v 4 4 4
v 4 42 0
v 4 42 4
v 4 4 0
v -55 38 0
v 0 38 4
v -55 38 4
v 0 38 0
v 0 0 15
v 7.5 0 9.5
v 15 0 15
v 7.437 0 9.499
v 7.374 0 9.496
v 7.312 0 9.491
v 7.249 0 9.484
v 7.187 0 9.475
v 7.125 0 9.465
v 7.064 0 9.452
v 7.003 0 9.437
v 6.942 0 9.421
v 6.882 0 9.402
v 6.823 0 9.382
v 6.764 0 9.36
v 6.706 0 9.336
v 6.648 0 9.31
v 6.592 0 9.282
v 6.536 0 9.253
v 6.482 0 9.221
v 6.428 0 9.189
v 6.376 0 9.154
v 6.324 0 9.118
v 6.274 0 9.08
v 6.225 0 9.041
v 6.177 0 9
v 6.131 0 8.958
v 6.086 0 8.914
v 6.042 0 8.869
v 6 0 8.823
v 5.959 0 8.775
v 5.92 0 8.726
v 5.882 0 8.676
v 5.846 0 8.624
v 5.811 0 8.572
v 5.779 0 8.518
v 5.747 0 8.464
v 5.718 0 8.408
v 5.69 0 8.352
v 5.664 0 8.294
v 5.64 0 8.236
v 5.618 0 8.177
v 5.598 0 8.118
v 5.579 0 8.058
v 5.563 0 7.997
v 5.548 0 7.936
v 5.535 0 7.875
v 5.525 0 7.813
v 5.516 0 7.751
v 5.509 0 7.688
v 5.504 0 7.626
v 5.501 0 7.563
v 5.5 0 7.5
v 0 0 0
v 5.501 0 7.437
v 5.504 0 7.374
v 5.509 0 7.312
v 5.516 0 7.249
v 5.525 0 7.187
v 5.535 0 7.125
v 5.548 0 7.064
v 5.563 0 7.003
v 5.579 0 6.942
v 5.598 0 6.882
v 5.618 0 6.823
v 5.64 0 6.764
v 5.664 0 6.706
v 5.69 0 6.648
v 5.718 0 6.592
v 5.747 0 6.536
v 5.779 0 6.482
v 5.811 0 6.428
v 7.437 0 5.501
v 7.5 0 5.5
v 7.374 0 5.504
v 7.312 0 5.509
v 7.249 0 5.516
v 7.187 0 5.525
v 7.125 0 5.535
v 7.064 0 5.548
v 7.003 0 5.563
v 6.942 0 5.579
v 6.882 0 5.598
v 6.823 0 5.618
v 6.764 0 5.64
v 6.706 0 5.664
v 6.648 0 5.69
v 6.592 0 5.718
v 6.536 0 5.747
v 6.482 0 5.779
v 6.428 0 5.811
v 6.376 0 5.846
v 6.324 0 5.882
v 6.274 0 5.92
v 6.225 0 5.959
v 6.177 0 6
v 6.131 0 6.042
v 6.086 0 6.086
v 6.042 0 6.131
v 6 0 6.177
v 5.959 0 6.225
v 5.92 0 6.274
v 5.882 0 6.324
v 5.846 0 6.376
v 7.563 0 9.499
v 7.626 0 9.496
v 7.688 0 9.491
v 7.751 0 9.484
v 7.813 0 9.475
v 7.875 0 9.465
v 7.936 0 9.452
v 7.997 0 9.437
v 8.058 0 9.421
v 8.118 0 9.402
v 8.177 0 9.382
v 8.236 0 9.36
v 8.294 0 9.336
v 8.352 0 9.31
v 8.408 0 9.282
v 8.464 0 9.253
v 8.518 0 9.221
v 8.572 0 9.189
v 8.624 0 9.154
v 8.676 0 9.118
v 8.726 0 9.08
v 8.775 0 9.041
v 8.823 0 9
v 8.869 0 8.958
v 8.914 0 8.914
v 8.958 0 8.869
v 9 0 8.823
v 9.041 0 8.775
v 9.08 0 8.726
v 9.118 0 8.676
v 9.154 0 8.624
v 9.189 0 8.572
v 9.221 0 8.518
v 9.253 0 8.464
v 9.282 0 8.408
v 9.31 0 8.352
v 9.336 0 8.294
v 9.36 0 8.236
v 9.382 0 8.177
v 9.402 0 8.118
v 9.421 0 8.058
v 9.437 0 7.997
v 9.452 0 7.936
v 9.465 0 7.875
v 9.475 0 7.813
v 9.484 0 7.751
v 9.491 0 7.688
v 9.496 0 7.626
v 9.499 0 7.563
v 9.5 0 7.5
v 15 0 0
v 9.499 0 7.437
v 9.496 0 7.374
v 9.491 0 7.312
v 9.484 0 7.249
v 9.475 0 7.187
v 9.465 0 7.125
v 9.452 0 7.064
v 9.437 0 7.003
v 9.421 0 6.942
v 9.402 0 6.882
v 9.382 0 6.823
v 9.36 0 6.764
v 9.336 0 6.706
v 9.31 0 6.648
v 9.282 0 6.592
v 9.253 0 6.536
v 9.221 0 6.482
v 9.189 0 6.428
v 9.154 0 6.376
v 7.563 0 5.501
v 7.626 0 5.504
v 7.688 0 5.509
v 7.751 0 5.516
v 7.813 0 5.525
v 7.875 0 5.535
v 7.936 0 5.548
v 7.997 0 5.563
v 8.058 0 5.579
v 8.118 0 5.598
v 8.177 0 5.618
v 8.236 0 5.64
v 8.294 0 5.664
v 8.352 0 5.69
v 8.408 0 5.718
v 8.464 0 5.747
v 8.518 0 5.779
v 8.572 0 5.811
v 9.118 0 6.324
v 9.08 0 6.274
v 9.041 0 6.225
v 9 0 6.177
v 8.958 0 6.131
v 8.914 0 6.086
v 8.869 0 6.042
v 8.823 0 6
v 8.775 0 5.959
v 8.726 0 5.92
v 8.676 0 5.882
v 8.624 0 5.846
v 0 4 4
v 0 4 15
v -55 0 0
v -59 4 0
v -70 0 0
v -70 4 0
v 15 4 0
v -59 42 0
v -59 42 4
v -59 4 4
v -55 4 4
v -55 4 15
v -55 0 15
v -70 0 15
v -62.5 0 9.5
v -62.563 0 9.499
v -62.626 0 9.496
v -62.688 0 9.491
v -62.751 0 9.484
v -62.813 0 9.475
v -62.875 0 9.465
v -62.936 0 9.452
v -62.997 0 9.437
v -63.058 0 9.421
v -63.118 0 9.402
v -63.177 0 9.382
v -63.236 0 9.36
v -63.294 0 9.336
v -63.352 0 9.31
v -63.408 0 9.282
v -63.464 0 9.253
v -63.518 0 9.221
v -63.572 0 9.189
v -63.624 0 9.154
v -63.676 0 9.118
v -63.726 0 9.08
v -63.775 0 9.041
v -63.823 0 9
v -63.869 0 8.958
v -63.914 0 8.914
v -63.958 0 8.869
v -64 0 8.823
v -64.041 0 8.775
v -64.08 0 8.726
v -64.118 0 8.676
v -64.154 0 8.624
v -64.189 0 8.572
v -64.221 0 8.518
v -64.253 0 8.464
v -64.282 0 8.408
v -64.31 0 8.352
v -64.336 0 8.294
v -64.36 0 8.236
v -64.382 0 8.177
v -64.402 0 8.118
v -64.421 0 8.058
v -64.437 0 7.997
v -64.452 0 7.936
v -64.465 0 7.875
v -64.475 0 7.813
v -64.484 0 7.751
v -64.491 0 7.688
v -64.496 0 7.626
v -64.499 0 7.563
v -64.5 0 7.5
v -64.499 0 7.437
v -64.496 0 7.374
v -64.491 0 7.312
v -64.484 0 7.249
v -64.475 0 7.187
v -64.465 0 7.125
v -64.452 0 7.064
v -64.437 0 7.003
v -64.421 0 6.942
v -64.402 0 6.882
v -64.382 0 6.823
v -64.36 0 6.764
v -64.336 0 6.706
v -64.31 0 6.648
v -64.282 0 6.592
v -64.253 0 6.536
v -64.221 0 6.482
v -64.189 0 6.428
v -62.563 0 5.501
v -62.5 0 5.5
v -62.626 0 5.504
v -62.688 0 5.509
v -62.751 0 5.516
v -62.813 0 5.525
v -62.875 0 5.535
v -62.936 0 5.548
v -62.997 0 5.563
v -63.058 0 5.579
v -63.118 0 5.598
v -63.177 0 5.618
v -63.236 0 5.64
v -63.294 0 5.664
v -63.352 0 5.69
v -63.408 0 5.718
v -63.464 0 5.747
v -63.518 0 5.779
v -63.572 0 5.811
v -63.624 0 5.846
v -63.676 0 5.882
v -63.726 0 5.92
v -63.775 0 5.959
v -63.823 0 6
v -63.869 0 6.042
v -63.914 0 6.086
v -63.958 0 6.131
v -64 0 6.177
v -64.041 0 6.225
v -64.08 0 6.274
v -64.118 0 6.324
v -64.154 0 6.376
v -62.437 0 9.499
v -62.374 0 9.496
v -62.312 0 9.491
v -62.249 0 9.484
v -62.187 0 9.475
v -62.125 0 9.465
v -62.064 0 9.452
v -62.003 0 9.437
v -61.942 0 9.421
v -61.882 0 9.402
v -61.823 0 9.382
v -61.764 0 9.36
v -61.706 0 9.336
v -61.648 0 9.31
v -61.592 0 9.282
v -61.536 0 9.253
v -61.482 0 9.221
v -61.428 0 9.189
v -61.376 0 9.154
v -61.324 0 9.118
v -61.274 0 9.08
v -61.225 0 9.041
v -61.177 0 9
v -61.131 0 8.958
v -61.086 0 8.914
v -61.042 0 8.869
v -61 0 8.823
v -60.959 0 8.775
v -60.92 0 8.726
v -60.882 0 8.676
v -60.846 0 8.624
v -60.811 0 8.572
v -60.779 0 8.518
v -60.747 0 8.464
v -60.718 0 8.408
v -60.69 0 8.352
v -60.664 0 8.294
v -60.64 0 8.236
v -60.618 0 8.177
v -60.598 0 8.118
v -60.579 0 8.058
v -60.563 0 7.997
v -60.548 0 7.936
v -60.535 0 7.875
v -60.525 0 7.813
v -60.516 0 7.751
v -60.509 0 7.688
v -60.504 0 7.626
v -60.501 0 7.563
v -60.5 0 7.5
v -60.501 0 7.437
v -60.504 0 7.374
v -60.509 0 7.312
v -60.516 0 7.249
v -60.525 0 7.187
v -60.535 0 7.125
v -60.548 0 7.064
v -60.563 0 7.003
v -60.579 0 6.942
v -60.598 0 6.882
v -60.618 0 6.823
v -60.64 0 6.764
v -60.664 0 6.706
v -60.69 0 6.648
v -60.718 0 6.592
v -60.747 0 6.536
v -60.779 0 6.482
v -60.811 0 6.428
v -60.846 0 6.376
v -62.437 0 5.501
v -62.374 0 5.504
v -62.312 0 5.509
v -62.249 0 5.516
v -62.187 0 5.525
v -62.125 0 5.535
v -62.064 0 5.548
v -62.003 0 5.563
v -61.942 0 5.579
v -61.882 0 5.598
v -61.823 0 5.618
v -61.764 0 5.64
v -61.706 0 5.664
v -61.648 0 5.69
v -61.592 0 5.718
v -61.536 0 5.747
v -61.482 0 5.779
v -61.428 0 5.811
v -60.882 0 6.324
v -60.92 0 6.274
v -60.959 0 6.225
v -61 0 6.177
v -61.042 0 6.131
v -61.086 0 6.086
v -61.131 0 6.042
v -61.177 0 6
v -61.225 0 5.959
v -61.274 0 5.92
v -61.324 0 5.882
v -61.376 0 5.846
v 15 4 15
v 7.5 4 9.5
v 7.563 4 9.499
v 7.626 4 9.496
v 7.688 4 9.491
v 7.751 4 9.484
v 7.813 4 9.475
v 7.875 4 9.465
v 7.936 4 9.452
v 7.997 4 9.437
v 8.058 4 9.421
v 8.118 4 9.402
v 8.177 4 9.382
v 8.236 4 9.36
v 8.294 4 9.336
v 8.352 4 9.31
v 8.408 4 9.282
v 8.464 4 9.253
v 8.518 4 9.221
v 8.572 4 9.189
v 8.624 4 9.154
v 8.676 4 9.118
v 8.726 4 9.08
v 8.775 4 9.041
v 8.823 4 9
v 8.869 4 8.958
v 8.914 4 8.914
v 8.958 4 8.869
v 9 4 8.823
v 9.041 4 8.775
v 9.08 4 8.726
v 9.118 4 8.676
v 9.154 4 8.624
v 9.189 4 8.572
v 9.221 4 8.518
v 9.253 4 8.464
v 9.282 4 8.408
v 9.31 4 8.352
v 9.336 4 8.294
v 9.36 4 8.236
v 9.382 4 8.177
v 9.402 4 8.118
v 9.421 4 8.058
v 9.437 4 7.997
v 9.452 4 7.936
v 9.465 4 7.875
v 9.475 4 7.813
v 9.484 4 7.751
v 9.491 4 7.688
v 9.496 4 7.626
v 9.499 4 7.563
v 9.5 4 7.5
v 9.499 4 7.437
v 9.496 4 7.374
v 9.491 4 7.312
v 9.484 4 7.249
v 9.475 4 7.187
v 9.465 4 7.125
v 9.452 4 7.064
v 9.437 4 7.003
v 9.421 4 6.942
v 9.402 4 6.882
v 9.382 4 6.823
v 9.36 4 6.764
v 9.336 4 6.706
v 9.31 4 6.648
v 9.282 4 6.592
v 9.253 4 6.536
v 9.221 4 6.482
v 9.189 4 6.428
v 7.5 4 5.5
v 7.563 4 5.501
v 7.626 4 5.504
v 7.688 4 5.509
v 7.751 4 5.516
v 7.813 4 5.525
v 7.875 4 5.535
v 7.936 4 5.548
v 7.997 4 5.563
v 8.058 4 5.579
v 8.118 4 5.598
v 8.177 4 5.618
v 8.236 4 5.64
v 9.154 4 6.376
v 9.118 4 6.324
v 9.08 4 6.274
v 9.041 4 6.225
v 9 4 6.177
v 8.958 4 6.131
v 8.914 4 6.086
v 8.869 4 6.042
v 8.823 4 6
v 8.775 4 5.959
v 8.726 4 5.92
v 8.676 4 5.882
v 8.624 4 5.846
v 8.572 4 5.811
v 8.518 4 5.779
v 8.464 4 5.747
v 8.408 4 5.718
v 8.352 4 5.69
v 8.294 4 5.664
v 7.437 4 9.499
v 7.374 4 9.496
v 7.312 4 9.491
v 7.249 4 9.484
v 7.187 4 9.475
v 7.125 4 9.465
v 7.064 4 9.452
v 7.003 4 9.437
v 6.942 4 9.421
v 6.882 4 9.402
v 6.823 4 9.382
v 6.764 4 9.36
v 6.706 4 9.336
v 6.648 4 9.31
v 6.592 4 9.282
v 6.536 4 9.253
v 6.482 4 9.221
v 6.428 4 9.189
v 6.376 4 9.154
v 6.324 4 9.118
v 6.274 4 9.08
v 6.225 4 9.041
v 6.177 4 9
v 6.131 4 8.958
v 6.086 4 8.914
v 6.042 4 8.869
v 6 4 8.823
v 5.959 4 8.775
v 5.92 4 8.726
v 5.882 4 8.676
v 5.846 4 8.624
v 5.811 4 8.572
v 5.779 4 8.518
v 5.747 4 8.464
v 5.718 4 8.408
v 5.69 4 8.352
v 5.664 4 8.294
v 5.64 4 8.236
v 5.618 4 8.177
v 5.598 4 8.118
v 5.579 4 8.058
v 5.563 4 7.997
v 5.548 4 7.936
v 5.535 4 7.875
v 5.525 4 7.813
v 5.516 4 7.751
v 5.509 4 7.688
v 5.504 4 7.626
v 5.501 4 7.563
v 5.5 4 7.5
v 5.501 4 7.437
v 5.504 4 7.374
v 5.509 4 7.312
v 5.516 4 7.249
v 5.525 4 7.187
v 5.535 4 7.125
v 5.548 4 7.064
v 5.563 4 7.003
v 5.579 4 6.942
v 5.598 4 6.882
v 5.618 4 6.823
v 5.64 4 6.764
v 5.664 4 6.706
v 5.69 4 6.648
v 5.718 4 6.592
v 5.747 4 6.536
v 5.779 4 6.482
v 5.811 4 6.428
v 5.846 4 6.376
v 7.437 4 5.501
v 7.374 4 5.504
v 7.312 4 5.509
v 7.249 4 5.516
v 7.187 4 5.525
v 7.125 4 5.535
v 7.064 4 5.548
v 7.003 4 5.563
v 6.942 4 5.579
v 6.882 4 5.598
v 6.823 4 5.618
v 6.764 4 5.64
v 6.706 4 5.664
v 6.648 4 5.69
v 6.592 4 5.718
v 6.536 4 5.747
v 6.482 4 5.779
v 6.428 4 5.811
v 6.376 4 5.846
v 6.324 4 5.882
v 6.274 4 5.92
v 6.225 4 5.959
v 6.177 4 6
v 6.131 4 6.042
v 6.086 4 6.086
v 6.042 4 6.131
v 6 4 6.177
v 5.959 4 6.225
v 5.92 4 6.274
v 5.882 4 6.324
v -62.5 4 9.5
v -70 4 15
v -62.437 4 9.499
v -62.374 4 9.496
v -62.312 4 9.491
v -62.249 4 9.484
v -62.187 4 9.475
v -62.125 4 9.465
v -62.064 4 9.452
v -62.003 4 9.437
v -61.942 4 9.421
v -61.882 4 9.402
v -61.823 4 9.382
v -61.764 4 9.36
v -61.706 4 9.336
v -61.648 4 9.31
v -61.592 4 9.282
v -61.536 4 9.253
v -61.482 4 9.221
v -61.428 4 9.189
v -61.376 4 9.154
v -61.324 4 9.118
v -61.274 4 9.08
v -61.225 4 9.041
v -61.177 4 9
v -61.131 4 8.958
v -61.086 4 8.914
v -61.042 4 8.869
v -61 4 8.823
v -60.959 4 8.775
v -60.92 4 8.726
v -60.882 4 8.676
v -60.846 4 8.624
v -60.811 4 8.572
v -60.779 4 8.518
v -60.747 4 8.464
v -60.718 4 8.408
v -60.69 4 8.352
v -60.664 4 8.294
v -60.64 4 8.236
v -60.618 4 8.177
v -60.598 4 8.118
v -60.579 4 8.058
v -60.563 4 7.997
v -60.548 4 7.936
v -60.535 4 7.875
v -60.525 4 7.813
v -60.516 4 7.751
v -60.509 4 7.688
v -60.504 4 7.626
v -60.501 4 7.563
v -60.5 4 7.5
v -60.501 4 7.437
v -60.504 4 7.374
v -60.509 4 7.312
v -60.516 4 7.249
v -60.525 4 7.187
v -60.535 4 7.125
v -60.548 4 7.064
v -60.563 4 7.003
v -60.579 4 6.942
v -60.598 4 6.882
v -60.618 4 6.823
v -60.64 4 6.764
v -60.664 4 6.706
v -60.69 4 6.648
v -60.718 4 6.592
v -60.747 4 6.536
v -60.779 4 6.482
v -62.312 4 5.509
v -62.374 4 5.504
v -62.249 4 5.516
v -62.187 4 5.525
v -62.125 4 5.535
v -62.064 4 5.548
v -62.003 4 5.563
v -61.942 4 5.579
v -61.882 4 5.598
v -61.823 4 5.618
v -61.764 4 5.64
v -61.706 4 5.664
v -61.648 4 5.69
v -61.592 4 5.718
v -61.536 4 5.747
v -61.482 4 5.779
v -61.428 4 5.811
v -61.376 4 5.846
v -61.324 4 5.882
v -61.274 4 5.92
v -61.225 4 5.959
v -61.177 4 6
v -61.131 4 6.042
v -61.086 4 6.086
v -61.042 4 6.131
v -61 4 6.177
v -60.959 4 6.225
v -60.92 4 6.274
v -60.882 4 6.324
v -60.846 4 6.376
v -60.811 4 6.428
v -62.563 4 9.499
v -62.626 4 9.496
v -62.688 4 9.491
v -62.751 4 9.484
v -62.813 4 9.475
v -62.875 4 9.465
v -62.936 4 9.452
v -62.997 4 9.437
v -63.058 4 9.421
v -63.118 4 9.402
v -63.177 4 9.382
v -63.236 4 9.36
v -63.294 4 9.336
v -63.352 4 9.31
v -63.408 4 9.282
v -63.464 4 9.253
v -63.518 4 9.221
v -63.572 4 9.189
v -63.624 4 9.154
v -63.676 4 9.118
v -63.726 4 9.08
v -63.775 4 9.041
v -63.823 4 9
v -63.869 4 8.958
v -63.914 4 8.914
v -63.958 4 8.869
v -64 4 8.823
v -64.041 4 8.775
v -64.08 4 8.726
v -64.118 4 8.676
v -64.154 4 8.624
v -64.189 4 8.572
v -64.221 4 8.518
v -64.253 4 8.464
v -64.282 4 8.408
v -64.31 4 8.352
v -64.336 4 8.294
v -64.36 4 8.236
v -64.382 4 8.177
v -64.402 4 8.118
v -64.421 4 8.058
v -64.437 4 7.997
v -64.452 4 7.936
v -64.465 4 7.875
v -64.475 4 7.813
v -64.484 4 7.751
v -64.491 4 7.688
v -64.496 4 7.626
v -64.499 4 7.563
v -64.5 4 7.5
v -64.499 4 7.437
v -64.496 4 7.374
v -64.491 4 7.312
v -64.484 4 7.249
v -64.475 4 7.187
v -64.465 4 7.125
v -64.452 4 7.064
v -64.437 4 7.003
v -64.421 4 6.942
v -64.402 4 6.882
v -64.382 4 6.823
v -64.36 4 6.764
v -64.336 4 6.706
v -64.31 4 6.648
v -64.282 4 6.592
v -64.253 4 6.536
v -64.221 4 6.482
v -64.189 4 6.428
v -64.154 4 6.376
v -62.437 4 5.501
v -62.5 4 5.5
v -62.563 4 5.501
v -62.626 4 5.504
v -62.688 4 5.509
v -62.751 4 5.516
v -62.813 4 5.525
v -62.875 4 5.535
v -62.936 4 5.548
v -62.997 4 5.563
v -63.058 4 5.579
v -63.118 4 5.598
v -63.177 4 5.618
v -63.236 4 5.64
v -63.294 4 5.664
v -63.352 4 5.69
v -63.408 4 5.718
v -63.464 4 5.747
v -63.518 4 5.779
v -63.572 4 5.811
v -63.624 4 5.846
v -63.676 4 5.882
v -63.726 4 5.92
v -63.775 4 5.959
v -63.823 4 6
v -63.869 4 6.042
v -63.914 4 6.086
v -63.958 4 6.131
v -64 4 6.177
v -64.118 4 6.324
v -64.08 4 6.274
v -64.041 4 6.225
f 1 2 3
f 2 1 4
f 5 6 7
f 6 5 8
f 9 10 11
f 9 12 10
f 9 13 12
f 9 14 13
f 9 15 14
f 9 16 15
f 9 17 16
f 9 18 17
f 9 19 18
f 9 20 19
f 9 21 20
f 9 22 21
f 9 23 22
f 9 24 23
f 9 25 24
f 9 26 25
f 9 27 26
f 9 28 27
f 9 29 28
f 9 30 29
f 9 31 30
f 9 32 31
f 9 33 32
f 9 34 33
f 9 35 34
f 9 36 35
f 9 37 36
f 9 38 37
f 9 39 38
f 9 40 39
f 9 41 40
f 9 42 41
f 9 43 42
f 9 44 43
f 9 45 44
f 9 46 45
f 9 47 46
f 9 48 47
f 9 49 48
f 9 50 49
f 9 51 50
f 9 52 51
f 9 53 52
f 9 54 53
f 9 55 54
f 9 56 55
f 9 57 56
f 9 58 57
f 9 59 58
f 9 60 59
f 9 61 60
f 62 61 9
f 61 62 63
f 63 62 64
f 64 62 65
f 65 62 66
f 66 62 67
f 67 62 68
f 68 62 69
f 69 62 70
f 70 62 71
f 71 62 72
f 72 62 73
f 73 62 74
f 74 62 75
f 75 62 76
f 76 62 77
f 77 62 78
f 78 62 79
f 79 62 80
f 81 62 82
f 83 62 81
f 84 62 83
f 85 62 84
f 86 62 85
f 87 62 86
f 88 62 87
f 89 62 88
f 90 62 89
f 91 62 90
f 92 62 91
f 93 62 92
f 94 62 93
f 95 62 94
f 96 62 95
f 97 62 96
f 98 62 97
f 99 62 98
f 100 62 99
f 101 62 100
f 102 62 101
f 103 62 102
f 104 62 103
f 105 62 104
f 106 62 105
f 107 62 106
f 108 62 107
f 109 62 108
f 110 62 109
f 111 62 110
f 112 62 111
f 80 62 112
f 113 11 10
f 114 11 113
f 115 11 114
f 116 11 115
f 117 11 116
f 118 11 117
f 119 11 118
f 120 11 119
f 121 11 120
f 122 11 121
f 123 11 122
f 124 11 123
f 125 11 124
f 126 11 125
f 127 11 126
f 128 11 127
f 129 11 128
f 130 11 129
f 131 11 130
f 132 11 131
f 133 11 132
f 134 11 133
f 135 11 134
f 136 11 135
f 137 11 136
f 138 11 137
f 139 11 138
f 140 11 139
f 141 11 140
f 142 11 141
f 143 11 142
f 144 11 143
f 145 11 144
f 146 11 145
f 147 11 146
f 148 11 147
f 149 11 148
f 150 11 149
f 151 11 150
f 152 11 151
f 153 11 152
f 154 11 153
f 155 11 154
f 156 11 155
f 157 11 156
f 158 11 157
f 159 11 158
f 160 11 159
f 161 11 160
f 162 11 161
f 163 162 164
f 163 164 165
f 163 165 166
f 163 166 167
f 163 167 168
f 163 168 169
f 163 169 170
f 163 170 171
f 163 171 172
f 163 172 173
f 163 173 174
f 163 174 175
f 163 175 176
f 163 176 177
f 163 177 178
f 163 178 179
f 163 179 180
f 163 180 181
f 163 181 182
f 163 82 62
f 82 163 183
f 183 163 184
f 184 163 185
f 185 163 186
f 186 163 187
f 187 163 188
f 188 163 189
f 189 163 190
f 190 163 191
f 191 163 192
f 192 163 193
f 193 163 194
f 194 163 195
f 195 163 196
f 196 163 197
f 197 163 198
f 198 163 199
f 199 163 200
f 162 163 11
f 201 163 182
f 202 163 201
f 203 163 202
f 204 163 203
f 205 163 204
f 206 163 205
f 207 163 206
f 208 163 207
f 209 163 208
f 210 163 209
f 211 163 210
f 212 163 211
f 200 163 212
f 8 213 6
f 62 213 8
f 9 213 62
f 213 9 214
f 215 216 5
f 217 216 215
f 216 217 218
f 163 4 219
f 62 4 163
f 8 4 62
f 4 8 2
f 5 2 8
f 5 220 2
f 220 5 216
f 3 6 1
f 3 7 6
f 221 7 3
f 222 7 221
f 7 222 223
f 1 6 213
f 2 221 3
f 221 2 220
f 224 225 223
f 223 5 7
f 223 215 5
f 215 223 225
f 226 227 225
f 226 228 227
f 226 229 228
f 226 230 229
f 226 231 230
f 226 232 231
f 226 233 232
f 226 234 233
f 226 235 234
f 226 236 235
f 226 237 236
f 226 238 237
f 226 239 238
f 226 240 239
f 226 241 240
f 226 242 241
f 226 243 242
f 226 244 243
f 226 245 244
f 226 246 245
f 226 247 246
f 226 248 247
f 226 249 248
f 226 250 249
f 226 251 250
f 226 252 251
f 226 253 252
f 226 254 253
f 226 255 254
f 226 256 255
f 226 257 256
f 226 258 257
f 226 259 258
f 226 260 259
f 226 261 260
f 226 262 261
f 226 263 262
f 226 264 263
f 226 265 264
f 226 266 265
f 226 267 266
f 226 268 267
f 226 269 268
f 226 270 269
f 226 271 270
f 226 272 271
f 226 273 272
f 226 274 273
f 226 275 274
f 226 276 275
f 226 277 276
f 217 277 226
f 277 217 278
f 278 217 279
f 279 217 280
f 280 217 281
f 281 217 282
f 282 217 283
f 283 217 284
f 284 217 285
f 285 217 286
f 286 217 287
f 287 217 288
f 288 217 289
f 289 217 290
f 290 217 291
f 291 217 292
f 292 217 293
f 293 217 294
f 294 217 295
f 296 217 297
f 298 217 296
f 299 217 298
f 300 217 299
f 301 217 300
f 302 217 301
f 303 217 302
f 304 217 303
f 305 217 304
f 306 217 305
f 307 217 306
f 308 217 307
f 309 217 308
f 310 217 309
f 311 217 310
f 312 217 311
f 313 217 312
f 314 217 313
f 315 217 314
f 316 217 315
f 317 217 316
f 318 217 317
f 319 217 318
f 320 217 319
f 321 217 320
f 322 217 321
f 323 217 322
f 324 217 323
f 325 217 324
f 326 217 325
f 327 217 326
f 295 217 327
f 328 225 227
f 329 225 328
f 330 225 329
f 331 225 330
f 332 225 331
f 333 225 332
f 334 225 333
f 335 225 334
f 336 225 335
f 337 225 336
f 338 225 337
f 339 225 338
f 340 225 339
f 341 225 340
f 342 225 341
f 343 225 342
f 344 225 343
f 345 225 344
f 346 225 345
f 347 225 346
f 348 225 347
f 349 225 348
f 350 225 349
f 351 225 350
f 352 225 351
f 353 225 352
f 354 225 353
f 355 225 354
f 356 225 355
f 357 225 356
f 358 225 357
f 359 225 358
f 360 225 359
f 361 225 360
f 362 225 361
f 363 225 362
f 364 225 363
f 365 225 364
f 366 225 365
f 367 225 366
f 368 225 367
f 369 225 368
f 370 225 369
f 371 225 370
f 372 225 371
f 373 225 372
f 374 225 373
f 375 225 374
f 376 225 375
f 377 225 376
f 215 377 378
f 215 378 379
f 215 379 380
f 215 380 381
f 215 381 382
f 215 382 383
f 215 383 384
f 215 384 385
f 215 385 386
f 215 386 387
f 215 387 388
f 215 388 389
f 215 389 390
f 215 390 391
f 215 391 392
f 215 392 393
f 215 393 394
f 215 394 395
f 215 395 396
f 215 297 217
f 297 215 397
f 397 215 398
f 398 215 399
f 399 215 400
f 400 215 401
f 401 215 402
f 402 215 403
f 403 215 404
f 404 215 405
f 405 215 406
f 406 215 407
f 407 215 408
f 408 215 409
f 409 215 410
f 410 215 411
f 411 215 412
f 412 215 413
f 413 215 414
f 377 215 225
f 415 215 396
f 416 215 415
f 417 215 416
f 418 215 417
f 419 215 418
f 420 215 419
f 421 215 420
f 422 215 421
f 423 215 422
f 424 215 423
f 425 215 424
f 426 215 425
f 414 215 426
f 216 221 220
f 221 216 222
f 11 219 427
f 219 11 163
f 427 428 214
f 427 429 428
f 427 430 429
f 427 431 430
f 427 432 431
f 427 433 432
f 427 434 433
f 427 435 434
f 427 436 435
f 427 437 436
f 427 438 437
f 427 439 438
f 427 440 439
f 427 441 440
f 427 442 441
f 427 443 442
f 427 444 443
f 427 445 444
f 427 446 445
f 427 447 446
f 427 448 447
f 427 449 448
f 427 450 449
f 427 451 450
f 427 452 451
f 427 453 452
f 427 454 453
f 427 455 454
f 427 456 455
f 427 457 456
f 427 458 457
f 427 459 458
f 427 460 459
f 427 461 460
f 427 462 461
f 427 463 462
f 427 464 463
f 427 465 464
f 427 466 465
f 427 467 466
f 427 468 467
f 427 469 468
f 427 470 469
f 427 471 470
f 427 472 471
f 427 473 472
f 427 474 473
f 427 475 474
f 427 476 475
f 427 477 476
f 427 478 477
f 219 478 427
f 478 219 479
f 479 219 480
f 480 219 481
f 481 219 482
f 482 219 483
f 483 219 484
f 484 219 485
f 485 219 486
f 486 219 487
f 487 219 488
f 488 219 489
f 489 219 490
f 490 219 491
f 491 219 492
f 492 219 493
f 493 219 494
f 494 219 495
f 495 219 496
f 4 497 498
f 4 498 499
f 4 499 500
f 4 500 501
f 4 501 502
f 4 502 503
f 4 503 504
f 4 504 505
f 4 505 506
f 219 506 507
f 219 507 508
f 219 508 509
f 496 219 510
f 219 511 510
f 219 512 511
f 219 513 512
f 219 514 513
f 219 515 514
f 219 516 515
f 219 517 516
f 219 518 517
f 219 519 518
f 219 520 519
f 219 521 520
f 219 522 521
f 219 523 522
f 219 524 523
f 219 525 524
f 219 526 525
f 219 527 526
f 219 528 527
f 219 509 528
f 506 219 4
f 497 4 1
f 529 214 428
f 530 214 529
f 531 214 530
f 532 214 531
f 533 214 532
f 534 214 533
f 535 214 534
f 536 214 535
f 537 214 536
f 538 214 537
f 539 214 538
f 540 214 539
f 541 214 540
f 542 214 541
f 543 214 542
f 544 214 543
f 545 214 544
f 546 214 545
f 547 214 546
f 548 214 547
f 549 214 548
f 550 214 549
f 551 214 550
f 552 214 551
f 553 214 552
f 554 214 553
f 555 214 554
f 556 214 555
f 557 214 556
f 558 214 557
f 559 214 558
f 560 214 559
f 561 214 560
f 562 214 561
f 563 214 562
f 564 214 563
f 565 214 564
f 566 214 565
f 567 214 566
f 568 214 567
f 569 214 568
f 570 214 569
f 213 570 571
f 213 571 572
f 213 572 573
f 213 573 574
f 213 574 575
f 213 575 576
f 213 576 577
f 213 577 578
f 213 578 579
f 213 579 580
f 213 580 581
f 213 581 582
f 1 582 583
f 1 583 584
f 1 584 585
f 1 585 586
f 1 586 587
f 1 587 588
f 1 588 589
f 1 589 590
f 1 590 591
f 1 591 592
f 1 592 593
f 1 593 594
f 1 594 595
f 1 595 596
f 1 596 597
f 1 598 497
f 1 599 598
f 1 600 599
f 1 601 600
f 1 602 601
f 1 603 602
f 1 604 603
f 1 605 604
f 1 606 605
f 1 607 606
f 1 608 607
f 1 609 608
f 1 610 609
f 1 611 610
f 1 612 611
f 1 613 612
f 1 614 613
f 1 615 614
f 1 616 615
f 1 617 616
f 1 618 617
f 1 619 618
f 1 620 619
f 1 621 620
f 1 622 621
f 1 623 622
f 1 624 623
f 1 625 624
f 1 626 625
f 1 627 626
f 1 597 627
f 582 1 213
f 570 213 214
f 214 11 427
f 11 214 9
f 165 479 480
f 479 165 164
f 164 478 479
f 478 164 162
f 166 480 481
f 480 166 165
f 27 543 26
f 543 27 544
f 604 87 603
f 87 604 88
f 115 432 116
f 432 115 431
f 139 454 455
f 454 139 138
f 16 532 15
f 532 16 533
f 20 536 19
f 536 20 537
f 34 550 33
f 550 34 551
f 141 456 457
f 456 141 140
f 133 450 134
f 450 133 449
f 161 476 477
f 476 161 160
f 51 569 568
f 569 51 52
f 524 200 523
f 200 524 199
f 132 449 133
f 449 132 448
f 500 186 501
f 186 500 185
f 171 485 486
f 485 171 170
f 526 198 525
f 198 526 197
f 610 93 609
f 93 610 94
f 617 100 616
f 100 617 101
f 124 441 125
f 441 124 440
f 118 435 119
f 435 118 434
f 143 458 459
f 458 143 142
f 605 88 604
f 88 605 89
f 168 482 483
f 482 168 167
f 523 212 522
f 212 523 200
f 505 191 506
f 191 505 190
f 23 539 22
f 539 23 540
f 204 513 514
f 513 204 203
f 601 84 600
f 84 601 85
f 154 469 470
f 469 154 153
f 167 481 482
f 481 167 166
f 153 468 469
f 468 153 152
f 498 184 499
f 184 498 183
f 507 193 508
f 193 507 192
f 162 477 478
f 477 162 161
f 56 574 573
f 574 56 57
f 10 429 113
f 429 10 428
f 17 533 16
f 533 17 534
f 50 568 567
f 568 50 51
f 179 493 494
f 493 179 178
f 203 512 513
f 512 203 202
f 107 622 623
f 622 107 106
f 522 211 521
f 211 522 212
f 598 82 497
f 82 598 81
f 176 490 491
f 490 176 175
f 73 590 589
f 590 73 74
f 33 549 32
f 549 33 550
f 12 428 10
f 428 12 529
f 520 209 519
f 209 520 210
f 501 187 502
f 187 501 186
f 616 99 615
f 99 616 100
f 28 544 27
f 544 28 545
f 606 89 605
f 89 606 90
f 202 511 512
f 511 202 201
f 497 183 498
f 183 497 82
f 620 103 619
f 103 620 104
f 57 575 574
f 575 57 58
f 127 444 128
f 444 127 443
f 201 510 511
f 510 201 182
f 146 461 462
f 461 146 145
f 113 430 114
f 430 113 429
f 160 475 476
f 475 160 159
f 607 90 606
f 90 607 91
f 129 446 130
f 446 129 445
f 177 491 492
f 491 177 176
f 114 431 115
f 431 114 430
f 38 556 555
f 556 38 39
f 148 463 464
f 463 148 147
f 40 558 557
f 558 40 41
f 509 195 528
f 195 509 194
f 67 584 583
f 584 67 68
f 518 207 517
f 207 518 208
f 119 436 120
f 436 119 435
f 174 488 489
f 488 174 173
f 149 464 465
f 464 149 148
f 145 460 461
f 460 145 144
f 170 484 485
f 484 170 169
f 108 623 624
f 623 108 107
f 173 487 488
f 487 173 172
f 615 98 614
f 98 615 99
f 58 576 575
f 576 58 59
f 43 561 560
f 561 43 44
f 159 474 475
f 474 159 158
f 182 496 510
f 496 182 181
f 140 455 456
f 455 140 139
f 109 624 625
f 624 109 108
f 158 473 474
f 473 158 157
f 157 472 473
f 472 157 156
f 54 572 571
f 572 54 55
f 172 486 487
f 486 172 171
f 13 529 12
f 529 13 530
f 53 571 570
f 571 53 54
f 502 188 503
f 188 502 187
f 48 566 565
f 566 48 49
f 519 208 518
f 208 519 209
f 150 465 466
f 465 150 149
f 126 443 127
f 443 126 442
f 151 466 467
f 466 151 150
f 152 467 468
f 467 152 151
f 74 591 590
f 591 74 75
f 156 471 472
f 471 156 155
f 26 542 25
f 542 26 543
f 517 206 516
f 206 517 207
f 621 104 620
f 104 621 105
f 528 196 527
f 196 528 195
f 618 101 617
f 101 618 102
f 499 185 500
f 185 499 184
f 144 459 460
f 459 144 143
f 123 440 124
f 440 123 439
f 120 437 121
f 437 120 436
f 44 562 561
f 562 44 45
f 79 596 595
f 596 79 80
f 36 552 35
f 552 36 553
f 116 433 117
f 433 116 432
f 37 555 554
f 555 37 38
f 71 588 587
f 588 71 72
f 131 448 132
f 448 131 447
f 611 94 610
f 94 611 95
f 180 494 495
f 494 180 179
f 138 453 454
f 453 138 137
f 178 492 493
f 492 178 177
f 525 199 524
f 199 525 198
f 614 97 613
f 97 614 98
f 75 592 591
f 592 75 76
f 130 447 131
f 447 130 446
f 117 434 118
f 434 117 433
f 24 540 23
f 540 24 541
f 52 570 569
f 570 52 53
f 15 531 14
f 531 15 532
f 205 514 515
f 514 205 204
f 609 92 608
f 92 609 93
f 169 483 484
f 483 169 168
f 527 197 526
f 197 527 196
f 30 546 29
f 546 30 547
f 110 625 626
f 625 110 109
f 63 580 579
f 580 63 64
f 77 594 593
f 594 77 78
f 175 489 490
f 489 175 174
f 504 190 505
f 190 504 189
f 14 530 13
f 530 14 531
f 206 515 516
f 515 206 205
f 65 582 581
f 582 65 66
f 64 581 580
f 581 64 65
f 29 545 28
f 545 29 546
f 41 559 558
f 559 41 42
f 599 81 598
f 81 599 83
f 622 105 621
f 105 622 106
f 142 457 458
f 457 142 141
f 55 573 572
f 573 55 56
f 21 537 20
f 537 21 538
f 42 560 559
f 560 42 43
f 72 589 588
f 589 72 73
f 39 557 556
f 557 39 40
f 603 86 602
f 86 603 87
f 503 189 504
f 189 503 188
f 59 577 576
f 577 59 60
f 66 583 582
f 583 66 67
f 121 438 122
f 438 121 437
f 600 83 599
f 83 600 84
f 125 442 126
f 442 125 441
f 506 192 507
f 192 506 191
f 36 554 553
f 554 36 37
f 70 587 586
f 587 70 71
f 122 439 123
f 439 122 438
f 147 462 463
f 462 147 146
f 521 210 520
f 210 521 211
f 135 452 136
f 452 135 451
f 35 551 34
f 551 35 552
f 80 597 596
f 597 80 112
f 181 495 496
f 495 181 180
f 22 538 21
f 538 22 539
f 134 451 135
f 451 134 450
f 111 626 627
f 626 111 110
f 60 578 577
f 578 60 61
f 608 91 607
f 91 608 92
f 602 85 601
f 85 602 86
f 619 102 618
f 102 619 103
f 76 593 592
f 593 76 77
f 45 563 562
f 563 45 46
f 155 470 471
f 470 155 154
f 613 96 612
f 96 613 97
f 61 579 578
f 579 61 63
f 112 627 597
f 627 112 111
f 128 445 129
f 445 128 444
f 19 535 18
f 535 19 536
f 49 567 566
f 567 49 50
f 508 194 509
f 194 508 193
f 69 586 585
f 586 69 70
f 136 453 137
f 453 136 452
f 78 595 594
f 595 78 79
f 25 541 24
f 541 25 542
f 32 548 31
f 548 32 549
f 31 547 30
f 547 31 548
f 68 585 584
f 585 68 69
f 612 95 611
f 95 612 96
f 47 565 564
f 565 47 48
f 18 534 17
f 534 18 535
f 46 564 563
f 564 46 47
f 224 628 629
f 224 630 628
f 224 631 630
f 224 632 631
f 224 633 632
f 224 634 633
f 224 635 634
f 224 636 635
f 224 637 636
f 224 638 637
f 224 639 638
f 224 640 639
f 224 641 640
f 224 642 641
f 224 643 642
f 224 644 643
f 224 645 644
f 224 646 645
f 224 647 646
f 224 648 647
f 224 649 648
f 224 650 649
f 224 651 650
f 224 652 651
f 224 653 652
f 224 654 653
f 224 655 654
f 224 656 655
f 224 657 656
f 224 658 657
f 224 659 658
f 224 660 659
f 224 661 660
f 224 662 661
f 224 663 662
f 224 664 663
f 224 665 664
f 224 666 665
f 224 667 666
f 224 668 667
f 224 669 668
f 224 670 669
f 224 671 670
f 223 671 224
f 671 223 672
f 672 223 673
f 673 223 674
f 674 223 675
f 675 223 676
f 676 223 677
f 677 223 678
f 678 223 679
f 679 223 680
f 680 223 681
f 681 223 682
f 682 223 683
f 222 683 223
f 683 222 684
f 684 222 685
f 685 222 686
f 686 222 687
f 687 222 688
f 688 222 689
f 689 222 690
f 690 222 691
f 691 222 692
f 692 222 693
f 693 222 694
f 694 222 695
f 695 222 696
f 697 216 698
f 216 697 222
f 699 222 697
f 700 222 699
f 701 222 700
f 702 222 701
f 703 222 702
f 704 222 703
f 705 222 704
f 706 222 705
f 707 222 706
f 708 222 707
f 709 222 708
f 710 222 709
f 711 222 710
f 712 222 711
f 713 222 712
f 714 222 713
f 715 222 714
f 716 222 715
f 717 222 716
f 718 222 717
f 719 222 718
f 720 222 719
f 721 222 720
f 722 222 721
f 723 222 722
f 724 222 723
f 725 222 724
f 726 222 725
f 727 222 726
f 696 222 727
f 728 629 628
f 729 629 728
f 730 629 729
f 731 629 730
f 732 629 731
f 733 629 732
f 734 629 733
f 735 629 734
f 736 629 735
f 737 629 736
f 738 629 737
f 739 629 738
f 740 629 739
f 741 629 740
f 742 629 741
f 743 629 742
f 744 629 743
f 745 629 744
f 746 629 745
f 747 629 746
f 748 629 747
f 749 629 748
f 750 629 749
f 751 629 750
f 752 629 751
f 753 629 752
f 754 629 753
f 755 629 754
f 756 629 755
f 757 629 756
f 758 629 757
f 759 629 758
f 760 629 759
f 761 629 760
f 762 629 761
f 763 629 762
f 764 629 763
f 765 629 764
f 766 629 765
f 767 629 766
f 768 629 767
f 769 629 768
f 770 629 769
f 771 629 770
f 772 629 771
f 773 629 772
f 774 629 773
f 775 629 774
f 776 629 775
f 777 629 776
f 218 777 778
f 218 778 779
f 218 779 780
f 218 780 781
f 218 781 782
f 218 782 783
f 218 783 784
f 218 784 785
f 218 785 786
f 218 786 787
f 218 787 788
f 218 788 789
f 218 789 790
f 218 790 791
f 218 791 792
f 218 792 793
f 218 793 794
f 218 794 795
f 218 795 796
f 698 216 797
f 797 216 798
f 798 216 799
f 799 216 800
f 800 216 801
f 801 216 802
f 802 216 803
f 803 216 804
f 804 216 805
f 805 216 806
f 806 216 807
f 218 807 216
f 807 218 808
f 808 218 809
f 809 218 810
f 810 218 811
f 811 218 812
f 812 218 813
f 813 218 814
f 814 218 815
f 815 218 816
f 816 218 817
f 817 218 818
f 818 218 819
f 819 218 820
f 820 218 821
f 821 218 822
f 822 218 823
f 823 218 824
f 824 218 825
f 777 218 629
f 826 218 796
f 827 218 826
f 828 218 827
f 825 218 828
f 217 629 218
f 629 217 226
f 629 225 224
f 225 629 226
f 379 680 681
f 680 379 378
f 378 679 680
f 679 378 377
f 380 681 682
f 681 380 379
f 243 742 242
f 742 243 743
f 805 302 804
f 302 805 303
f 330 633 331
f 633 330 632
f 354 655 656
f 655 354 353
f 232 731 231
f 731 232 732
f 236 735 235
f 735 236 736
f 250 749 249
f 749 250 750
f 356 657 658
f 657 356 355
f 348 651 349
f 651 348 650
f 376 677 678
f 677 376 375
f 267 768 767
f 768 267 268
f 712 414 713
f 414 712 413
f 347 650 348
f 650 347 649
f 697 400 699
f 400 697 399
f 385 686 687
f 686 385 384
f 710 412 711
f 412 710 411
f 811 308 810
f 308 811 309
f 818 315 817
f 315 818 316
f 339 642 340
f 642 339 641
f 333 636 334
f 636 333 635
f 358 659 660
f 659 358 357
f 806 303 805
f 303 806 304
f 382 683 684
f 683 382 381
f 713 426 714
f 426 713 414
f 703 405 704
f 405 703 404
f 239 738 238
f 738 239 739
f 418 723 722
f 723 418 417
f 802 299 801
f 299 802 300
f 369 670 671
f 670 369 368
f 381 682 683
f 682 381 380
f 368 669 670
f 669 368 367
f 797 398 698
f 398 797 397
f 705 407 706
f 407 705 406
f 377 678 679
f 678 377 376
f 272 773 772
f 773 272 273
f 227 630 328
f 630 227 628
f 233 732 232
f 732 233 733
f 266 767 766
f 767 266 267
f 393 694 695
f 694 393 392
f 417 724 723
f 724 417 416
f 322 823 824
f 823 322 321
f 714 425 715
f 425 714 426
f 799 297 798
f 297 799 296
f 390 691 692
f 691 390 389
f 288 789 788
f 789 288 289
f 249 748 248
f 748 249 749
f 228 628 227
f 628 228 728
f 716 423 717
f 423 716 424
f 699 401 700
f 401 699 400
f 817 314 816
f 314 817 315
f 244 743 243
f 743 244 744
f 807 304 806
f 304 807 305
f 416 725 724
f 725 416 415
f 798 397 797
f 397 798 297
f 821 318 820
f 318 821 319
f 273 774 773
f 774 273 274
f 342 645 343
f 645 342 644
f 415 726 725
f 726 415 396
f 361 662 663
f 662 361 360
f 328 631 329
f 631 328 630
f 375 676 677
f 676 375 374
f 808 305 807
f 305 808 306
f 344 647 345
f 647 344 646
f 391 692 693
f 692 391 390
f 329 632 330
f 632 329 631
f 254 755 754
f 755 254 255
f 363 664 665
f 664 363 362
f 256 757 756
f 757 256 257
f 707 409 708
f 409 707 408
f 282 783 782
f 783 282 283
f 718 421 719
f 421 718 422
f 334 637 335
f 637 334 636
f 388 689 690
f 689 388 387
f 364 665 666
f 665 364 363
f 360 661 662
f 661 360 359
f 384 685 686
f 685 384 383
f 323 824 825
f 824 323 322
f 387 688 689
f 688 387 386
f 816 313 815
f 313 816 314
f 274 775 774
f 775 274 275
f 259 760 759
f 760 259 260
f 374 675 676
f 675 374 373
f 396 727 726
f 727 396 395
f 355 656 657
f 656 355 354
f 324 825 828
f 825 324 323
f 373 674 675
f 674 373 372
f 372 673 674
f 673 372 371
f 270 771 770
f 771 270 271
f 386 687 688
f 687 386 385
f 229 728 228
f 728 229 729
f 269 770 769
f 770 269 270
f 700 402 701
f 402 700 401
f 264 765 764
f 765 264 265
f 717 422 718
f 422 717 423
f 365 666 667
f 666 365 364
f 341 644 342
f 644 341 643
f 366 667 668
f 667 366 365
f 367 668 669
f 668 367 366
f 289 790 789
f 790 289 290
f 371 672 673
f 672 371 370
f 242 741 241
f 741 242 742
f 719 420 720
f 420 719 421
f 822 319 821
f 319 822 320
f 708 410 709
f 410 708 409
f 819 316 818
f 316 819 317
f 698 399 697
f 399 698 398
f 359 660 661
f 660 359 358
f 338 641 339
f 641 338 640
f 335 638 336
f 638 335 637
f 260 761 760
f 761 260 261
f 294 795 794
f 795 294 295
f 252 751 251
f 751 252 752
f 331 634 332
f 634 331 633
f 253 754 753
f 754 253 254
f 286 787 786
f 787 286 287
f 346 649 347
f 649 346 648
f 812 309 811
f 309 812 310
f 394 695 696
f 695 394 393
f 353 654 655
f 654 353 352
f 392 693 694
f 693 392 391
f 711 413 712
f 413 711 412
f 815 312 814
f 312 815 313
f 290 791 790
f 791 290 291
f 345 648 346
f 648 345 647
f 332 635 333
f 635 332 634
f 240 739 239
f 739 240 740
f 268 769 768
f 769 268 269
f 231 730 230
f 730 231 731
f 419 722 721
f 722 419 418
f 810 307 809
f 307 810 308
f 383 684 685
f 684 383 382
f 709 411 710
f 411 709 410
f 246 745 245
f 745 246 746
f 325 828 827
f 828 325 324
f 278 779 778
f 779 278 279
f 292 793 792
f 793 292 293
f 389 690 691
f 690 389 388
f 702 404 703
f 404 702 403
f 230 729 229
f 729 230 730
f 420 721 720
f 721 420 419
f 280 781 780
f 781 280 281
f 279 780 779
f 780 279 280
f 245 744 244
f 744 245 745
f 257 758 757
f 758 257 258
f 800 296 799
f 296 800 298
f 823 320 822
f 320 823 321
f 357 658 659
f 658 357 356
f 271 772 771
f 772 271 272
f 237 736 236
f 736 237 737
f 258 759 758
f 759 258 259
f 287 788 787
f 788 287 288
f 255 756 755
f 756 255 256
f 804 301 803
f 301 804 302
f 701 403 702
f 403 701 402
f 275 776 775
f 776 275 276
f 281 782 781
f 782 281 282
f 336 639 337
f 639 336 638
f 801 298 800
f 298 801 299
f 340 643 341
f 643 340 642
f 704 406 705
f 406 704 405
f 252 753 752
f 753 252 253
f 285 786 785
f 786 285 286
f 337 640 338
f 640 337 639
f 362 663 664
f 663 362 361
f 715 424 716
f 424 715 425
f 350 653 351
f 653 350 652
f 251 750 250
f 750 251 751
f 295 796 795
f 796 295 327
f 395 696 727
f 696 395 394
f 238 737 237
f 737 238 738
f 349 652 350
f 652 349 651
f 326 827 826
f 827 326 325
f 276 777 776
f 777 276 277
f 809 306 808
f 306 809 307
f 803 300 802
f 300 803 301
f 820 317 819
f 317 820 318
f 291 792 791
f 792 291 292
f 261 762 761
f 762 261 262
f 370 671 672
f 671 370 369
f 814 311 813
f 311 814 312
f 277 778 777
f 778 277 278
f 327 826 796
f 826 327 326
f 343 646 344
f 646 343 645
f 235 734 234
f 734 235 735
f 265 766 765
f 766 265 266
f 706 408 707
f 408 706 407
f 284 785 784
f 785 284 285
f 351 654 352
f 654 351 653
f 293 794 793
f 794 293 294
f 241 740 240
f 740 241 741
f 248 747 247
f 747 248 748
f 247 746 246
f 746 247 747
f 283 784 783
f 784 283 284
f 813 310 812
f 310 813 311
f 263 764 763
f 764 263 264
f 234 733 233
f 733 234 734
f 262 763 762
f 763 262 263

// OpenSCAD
{ // Part dimension
  length = 51;
  height = 38;
  width = 4;
  thickness = 4;
  leg_hole_diameter = 4;
  leg_size = 15;

  $fn = 200;
}

module leg() {
  difference() {
    cube([leg_size, leg_size, thickness]);
    translate([leg_size/2, leg_size/2, 0]) {
      cylinder(d=leg_hole_diameter, h=thickness);
    }
  }
}

module bracket_no_leg() { 
  cube([thickness, width, height]);
  translate([-length - thickness, 0, height]) {
    cube([length + 2*thickness, width, thickness]);
  }
  translate([-length - 2*thickness, 0, 0]) {
    cube([thickness, width, height + thickness]);
  }
}

module part() {
  // leg();
  bracket_no_leg();
  translate([0, -leg_size + width, 0]) {
    leg();
  }
  translate([-length-thickness - leg_size, -leg_size + width, 0]) {
    leg();
  }
}

translate([0, 0, width]) {
rotate([-90, 0, 0]) {
    part();
  }
}
